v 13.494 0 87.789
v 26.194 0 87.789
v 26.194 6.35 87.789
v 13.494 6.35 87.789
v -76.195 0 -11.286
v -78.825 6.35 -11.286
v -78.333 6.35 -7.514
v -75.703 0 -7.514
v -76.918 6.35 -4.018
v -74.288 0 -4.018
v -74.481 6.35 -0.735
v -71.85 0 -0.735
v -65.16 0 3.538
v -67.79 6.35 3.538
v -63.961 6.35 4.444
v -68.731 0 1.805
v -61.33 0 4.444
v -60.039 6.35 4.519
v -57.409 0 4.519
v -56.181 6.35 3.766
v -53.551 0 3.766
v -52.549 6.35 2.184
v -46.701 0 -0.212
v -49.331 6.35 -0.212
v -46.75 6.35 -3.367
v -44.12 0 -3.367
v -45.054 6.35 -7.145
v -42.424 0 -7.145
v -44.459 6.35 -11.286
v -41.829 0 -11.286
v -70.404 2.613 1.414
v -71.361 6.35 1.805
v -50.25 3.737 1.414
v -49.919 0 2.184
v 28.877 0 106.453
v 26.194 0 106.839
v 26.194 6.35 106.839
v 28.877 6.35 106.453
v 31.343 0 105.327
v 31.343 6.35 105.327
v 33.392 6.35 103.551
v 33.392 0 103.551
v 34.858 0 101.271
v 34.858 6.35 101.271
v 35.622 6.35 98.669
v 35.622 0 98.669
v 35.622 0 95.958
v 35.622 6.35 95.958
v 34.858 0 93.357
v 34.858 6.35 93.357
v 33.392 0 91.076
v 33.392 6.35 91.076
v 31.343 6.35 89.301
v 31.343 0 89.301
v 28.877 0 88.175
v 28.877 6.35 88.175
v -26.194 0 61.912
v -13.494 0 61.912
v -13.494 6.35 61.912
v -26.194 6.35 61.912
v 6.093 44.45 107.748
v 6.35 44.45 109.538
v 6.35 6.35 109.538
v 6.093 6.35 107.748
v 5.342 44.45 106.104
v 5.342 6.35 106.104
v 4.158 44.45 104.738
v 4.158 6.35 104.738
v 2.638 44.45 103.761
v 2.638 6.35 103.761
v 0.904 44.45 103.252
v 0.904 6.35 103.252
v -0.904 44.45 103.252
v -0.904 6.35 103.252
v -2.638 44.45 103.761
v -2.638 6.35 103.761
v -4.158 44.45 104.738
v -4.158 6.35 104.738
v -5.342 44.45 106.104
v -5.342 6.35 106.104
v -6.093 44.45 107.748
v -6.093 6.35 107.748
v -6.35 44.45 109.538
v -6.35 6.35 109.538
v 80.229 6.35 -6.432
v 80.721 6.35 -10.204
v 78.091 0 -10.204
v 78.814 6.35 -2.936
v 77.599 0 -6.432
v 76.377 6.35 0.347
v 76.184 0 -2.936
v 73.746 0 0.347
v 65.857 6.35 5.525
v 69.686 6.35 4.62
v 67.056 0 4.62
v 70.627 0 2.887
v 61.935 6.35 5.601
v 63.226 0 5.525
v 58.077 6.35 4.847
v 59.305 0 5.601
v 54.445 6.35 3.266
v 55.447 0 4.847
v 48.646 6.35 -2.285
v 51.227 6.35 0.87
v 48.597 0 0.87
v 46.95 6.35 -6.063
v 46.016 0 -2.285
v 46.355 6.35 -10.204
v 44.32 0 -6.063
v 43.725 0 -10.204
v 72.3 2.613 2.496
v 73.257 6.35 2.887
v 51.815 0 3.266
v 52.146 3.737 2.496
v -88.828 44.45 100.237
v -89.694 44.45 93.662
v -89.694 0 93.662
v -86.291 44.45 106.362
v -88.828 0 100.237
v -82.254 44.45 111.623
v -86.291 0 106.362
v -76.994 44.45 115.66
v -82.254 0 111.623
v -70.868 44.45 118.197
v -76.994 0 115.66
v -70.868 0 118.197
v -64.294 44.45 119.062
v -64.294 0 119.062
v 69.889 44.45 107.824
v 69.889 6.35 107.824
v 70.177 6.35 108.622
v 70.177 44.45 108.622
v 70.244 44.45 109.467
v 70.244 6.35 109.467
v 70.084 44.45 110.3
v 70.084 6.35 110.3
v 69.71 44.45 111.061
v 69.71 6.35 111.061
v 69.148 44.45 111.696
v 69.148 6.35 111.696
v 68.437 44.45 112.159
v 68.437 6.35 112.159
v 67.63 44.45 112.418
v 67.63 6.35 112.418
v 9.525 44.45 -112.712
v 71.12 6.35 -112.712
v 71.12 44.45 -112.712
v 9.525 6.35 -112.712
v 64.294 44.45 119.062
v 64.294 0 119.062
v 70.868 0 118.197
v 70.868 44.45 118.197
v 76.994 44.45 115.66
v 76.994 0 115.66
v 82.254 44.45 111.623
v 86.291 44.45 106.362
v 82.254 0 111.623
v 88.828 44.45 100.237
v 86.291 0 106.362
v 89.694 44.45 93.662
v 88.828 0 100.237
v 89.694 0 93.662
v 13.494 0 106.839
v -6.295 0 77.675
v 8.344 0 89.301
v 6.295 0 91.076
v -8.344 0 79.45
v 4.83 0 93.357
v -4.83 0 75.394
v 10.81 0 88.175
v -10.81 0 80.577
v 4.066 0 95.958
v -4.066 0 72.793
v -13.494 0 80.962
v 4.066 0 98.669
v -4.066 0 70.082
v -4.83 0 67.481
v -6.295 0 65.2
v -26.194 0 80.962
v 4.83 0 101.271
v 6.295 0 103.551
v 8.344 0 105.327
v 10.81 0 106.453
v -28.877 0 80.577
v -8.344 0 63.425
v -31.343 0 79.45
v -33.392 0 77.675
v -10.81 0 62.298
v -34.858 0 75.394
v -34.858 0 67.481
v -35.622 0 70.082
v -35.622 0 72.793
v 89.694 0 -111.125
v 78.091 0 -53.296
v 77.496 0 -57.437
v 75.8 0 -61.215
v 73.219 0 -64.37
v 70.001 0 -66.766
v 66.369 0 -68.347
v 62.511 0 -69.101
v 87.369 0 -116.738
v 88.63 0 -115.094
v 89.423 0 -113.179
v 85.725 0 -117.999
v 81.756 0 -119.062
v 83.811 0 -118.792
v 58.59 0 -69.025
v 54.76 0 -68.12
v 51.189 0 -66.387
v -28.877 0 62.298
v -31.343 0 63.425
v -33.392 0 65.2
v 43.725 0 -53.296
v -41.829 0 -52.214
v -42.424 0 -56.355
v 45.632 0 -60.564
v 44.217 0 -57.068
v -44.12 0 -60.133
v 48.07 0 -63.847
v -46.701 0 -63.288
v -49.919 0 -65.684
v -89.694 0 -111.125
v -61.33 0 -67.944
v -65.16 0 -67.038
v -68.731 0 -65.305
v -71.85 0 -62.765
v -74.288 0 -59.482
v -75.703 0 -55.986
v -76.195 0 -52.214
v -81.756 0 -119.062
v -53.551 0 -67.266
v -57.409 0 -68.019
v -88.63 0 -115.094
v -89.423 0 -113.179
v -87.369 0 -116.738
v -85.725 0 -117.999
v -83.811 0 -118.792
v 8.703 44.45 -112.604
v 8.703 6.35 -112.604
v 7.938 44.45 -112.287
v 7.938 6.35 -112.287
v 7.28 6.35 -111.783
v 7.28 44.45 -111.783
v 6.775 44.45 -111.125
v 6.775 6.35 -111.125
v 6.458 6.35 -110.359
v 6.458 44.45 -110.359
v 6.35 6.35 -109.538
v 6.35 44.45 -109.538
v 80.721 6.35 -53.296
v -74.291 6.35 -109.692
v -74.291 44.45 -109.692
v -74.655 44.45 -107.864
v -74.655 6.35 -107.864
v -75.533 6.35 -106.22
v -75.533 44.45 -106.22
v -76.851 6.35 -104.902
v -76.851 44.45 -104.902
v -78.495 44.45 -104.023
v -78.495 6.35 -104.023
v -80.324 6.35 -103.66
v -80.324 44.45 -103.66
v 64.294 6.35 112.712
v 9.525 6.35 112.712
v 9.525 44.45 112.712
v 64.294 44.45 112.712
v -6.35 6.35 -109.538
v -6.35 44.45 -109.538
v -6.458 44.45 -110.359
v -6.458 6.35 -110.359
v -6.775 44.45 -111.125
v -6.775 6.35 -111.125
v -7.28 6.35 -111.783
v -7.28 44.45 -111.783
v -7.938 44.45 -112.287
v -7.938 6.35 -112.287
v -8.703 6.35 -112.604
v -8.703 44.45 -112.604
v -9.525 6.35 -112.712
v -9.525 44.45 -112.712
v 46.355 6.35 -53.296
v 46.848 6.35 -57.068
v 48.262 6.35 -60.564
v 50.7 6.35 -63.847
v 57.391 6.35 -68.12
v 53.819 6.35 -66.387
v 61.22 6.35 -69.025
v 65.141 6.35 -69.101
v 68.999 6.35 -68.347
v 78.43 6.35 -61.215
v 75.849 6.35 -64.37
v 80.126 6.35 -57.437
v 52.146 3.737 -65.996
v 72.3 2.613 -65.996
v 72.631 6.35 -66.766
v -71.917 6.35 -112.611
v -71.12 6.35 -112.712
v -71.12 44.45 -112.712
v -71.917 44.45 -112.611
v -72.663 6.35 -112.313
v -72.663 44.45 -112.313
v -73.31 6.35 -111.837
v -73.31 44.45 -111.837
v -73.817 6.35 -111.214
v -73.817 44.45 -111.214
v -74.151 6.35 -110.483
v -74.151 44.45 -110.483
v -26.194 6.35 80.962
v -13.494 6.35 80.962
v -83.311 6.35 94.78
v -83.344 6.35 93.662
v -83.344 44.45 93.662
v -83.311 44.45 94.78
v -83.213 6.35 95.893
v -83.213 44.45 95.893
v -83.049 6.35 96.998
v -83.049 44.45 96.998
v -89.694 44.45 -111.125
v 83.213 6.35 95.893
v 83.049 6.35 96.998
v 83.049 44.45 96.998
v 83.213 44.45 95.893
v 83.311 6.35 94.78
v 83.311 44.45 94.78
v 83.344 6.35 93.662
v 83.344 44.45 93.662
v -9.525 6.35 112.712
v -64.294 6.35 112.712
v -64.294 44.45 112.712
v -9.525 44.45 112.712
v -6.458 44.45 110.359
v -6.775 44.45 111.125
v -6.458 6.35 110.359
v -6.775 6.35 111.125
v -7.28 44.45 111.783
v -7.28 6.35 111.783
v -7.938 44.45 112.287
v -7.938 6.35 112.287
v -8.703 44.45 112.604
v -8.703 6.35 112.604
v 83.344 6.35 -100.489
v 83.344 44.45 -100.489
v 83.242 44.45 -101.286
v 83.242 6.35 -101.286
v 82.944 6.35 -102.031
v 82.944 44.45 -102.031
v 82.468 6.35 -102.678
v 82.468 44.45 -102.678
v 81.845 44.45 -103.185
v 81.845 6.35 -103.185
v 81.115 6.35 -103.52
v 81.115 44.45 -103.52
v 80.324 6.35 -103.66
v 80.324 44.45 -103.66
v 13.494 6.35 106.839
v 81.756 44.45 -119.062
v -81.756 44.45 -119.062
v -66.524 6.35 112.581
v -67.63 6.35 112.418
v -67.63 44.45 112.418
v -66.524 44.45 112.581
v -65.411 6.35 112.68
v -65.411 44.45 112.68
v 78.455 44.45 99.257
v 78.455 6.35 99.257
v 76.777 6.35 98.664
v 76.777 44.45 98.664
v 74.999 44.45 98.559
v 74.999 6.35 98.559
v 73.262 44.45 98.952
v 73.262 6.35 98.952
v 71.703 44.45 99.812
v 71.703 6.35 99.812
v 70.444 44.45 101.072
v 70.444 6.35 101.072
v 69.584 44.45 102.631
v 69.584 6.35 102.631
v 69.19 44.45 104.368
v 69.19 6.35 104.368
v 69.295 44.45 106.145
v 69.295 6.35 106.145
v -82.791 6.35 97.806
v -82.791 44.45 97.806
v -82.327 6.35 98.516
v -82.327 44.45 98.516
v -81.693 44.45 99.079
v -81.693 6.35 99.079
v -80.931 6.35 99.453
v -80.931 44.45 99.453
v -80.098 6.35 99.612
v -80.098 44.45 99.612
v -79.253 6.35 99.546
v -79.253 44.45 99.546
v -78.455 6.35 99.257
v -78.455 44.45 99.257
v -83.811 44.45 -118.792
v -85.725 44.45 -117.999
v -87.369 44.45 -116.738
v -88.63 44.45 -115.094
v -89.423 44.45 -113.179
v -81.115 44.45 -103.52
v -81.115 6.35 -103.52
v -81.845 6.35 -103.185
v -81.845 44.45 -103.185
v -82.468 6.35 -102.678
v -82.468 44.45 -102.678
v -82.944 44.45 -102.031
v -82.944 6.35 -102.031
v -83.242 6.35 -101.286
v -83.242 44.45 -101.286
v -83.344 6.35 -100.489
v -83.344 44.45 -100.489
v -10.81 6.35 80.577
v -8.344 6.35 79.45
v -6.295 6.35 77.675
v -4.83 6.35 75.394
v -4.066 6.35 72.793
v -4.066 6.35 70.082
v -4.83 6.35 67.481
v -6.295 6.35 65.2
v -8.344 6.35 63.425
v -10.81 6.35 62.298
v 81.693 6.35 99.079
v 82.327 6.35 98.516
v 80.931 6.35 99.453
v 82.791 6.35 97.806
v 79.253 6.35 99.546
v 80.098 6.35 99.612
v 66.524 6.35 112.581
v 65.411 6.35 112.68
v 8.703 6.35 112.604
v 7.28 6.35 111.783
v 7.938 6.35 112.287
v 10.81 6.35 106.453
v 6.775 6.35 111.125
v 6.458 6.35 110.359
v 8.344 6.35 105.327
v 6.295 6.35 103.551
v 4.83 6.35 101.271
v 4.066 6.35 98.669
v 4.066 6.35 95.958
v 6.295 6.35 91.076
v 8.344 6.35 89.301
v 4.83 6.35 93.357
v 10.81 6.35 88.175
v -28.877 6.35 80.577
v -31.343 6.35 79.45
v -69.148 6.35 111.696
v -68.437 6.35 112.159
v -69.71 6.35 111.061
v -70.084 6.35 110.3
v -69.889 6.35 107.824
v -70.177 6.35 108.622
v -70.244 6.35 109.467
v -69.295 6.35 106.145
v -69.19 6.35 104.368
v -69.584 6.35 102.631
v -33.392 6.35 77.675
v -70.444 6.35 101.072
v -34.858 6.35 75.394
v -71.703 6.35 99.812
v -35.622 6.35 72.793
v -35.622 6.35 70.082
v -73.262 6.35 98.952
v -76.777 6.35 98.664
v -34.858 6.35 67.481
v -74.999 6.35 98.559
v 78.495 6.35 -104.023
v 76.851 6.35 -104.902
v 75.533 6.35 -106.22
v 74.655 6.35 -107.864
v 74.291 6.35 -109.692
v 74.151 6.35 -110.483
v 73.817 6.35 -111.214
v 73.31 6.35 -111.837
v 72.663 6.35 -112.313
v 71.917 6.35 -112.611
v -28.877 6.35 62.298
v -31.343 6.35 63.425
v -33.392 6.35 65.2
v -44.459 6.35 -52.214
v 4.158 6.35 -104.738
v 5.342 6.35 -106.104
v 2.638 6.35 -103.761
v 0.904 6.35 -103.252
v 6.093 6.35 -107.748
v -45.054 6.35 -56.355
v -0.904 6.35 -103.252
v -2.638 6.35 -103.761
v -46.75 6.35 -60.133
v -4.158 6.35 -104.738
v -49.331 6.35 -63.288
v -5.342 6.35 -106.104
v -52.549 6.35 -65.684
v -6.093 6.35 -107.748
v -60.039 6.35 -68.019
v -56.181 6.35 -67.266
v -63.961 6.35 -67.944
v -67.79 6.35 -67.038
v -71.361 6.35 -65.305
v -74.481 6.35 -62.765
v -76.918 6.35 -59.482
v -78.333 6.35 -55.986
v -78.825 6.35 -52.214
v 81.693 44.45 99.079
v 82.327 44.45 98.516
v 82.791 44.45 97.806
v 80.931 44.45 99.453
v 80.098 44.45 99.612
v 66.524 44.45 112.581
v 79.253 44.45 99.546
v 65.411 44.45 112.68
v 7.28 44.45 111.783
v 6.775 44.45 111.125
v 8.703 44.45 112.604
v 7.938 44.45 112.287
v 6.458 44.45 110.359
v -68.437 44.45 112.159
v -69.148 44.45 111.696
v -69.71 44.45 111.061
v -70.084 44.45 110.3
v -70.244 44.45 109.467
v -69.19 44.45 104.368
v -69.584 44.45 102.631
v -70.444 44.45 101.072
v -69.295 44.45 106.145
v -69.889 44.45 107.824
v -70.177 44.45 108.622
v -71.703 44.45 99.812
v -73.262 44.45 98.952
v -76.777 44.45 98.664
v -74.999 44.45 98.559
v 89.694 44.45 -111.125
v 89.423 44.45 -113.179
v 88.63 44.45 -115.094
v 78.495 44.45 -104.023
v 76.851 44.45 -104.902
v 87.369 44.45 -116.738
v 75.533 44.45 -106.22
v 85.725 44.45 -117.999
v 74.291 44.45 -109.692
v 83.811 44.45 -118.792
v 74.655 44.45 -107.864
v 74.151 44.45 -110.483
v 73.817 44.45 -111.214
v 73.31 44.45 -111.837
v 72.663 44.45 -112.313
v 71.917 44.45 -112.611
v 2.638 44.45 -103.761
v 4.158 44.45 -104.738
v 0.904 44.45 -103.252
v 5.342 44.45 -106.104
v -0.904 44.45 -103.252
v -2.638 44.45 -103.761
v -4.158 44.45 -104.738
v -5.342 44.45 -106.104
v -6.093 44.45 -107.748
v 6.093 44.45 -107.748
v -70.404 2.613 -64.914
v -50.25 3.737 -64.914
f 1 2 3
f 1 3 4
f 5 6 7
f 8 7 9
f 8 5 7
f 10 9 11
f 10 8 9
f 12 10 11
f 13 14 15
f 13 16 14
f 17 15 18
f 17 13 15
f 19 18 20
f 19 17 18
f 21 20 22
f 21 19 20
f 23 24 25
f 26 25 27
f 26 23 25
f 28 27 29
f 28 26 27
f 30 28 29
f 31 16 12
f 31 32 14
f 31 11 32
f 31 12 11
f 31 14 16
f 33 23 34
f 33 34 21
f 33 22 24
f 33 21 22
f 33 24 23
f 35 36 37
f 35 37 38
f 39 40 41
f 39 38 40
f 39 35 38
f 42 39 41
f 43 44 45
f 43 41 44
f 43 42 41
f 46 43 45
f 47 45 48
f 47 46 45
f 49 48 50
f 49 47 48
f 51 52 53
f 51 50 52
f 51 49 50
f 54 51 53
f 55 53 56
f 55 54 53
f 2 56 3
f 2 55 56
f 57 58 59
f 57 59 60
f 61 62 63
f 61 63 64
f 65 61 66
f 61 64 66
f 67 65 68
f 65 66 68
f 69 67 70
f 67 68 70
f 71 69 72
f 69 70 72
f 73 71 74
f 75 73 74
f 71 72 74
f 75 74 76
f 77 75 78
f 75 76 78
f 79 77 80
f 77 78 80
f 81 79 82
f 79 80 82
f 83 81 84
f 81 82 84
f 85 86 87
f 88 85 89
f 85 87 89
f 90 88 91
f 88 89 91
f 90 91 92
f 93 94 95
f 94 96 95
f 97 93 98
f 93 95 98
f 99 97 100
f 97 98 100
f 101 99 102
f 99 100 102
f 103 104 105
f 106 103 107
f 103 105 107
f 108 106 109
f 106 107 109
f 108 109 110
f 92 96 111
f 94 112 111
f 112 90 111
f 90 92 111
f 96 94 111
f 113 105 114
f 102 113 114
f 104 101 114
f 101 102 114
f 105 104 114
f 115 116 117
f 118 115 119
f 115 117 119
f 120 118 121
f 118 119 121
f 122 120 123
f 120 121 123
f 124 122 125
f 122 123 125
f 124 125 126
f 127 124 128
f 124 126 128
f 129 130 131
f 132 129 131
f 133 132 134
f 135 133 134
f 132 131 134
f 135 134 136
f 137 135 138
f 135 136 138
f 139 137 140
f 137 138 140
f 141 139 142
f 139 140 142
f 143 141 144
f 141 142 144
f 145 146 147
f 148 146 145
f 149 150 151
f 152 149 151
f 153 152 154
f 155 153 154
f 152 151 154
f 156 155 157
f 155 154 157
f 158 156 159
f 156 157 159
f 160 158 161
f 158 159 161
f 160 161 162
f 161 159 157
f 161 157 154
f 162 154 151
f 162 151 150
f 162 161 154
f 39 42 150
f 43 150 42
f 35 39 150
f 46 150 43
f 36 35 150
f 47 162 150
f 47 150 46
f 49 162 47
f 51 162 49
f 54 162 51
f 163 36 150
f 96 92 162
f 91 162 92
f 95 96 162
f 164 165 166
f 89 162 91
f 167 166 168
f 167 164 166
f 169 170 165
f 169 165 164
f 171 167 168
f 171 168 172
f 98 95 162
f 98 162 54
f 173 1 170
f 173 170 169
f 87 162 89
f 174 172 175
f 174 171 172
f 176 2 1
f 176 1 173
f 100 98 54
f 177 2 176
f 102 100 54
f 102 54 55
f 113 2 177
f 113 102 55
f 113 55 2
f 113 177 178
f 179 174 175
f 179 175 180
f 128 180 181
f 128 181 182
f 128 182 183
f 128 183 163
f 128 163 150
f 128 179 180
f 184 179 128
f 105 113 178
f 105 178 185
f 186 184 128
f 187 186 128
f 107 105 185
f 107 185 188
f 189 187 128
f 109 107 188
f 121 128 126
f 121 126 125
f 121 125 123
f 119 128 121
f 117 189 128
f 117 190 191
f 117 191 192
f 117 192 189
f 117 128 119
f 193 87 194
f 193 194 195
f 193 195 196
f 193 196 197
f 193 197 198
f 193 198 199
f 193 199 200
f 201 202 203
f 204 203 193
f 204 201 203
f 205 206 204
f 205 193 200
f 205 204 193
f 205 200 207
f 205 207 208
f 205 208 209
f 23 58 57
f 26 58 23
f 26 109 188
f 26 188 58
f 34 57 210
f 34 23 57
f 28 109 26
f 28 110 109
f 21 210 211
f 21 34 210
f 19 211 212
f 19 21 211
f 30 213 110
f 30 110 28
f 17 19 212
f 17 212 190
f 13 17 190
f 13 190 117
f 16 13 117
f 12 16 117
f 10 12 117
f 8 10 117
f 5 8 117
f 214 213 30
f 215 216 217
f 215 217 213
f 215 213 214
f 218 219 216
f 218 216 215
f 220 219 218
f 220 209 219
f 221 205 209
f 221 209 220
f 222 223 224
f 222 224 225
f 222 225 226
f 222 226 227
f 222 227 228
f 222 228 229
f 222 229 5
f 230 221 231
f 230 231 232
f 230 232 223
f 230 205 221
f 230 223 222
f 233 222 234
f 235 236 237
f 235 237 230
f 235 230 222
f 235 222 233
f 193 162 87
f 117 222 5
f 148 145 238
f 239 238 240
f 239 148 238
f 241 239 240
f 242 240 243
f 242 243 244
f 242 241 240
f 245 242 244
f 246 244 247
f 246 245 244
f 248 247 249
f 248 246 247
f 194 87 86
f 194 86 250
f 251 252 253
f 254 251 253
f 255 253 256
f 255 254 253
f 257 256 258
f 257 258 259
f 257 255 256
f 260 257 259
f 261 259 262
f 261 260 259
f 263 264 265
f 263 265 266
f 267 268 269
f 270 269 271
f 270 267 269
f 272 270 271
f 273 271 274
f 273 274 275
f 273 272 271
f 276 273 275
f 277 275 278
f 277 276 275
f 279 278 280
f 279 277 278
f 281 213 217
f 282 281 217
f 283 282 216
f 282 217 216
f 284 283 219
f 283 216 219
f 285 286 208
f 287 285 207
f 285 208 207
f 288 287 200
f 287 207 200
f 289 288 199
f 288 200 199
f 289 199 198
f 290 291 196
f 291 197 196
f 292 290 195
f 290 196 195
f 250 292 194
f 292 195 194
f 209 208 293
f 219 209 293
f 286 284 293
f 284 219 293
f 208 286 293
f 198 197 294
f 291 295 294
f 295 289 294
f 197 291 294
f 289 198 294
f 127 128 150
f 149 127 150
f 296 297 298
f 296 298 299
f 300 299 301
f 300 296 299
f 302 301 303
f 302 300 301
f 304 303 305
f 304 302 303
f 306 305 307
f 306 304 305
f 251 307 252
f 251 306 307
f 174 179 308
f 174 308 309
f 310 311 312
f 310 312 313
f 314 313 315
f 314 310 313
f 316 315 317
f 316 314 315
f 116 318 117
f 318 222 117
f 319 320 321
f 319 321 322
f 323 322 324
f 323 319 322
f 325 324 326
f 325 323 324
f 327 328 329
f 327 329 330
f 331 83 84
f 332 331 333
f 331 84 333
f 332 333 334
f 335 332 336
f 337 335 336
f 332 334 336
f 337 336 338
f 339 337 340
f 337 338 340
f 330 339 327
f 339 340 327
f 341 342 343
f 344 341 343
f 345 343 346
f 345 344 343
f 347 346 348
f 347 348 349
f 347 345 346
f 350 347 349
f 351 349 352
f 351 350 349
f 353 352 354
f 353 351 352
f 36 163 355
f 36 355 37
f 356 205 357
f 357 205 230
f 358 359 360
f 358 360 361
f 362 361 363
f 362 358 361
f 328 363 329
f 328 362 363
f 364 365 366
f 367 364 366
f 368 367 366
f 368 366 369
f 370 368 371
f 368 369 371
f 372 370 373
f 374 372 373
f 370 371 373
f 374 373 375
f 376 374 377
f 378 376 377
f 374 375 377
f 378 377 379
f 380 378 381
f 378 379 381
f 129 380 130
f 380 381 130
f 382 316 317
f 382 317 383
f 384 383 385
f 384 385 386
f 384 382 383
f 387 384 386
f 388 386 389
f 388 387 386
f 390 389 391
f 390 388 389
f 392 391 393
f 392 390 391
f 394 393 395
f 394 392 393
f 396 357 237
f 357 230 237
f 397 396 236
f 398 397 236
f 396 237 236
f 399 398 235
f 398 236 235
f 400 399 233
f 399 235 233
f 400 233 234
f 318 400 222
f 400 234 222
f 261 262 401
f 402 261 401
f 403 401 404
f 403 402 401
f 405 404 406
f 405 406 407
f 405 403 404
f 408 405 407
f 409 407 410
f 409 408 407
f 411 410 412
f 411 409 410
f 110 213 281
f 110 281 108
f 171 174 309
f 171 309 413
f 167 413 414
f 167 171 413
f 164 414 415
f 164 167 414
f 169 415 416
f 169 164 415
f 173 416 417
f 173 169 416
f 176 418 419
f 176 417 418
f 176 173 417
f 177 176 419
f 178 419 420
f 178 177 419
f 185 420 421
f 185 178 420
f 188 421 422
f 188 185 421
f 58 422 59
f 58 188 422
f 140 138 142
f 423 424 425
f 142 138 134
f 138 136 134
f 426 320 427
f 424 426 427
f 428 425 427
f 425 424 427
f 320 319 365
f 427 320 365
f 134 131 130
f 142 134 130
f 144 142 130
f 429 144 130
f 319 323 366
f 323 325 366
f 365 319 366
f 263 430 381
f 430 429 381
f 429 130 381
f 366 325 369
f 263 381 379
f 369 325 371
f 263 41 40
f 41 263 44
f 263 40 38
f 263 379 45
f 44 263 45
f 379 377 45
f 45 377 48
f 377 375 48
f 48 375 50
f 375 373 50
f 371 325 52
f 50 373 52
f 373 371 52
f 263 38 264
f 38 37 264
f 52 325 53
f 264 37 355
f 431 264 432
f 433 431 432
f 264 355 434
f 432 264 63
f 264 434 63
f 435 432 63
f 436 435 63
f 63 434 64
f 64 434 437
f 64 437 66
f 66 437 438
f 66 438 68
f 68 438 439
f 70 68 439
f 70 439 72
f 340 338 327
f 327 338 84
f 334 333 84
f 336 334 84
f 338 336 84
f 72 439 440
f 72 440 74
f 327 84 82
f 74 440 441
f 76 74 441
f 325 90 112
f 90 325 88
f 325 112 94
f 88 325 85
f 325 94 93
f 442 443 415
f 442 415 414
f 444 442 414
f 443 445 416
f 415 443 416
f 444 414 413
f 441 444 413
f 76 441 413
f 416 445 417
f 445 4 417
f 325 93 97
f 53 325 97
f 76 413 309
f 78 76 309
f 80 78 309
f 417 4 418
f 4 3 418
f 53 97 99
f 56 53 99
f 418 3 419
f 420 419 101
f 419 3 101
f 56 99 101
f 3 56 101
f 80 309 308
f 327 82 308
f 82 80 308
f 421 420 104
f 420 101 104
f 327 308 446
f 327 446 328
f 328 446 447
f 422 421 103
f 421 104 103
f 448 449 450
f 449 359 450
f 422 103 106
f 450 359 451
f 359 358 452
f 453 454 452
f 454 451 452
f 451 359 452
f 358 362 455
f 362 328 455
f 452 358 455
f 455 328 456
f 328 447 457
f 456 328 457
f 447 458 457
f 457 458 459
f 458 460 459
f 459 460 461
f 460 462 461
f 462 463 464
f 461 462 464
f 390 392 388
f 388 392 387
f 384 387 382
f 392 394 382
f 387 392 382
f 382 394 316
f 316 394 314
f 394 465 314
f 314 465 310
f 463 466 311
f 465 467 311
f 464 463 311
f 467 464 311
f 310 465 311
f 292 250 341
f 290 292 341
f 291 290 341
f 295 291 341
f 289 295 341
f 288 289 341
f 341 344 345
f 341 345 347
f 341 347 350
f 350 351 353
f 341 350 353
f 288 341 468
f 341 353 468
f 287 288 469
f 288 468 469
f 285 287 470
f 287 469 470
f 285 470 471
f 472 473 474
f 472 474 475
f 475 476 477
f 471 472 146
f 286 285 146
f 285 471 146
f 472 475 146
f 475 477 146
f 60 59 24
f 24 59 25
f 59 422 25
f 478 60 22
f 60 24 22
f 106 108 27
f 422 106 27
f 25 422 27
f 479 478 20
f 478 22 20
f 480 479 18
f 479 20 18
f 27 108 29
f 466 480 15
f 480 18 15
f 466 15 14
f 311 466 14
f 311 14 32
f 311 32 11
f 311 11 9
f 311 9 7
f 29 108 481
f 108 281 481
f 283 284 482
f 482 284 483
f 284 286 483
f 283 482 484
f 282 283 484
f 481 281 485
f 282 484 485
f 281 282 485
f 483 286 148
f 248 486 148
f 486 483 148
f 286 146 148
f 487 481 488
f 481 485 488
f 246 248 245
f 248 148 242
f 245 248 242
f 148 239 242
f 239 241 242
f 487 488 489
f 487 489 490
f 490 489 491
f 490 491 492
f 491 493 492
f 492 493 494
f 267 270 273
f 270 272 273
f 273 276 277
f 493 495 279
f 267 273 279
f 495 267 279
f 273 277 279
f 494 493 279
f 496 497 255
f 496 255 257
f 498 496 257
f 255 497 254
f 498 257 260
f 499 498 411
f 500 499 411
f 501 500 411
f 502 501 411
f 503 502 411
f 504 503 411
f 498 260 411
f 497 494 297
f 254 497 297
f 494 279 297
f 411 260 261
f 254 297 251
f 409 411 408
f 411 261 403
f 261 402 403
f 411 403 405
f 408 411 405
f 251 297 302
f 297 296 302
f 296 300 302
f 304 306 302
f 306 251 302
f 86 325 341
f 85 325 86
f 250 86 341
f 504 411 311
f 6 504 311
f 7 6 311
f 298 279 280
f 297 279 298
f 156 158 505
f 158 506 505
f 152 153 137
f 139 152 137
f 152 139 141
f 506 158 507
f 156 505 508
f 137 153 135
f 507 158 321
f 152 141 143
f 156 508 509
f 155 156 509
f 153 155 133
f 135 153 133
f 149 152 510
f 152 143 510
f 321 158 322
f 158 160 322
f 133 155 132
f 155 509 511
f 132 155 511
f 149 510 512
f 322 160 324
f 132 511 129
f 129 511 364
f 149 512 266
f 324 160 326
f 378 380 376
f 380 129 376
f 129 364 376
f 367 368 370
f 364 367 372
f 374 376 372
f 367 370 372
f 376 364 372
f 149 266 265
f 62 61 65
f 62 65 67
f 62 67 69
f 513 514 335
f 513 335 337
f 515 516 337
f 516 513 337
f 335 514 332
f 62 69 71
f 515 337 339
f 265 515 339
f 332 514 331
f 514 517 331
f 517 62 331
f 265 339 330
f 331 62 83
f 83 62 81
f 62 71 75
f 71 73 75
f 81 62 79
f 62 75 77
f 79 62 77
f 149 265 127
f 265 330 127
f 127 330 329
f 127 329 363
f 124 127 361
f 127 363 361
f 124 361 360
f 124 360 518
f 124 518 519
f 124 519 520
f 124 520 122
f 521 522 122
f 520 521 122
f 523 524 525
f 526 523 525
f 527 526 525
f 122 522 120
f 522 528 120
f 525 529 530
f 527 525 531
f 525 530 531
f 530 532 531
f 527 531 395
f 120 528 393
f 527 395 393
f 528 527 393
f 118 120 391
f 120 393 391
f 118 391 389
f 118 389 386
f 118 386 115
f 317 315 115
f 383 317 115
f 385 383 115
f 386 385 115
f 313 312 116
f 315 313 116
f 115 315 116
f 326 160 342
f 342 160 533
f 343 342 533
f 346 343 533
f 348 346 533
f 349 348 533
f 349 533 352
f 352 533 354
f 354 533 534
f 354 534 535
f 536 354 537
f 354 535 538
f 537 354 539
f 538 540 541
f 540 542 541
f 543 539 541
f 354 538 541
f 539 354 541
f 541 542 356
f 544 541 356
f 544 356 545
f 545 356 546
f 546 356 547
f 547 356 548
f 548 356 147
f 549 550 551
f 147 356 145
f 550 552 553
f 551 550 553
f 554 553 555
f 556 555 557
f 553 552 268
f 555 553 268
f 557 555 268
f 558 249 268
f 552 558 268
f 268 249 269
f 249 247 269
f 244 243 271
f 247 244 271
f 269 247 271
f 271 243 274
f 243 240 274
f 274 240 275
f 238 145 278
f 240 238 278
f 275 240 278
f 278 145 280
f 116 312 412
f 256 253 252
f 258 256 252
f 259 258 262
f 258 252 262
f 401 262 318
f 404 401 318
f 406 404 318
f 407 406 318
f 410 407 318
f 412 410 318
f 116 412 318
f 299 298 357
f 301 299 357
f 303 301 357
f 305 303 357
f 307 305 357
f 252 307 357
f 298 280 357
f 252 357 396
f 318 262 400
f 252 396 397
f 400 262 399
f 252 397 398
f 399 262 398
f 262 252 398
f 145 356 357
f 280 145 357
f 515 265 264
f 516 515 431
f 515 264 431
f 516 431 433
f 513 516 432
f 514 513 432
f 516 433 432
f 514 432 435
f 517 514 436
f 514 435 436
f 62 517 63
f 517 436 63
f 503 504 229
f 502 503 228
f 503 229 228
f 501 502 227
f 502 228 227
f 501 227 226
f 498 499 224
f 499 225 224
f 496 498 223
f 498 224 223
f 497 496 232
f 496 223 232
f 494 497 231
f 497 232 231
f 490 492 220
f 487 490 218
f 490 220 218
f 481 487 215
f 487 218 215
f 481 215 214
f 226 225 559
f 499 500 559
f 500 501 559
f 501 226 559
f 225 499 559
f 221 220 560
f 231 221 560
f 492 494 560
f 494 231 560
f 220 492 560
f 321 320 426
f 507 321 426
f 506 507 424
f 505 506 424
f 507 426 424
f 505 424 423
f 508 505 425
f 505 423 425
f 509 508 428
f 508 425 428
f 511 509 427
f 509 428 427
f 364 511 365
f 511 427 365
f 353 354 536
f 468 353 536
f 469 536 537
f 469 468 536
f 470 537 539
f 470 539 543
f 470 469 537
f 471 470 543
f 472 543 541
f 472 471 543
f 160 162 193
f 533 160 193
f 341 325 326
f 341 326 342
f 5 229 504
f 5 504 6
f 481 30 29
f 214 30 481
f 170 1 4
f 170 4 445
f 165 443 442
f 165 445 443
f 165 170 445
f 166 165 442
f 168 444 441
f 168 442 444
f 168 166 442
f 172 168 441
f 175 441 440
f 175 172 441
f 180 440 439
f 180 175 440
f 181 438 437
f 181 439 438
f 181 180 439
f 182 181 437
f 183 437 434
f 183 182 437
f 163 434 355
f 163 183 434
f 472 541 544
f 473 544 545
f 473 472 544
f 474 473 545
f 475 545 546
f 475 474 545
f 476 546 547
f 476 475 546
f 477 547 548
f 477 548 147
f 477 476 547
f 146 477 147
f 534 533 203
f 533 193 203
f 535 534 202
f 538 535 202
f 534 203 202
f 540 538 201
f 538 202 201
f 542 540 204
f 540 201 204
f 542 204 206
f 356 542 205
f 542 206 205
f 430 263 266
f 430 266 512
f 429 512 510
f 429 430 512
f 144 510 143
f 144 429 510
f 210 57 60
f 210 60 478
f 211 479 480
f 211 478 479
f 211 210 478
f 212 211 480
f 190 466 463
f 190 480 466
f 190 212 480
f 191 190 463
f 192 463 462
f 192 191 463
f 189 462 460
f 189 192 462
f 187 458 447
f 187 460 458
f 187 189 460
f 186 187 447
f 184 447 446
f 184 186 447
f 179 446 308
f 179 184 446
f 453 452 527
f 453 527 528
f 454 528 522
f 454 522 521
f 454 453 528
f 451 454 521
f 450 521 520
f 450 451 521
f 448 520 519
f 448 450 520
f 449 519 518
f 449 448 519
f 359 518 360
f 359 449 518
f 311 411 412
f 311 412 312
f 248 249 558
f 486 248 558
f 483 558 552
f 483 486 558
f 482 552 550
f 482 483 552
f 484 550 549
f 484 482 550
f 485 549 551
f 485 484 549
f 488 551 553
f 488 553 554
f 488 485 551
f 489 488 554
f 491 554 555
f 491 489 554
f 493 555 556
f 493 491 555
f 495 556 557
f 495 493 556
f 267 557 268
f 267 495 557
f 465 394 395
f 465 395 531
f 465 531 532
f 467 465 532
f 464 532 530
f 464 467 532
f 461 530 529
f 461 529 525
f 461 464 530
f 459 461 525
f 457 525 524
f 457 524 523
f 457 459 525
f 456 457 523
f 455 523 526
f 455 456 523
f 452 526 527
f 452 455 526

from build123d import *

# Parameters (mm, degrees)
BOSS_EXTRUDE1_DEPTH     = 6.35
BOSS_EXTRUDE2_DEPTH     = 38.1
CUT_EXTRUDE1_DEPTH      = 12.7
CUT_EXTRUDE1_DEPTH_BACK = 25.4
CUT_EXTRUDE2_DEPTH      = 6.35
CUT_EXTRUDE2_DEPTH_BACK = 25.4
CUT_EXTRUDE3_DEPTH      = 156.552724943
BOSS_EXTRUDE3_DEPTH     = 38.1


with BuildPart() as part:
    # Sketch1 → Boss-Extrude1 (new body)
    with BuildSketch(Plane(origin=(0, 0, 0), x_dir=(1, 0, 0), z_dir=(0, 1, 0))):
        with BuildLine():
            Line((-81.75625, 119.0625), (81.75625, 119.0625))
            ThreePointArc((81.75625, 119.0625), (87.368910076, 116.737660076), (89.69375, 111.125))
            Line((89.69375, 111.125), (89.69375, -93.6625))
            ThreePointArc((89.69375, -93.6625), (82.254262242, -111.623012242), (64.29375, -119.0625))
            Line((64.29375, -119.0625), (-64.29375, -119.0625))
            ThreePointArc((-64.29375, -119.0625), (-82.254262242, -111.623012242), (-89.69375, -93.6625))
            Line((-89.69375, -93.6625), (-89.69375, 111.125))
            ThreePointArc((-89.69375, 111.125), (-87.368910076, 116.737660076), (-81.75625, 119.0625))
        make_face()
    extrude(amount=BOSS_EXTRUDE1_DEPTH)

    # Sketch2 → Boss-Extrude2 (add)
    with BuildSketch(Plane(origin=(0, 6.35, 0), x_dir=(1, 0, 0), z_dir=(0, 1, 0))):
        with BuildLine():
            Line((89.69375, -93.6625), (89.69375, 111.125))
            ThreePointArc((89.69375, 111.125), (87.368910076, 116.737660076), (81.75625, 119.0625))
            Line((81.75625, 119.0625), (-81.75625, 119.0625))
            ThreePointArc((-81.75625, 119.0625), (-87.368910076, 116.737660076), (-89.69375, 111.125))
            Line((-89.69375, 111.125), (-89.69375, -93.6625))
            ThreePointArc((-89.69375, -93.6625), (-82.254262242, -111.623012242), (-64.29375, -119.0625))
            Line((-64.29375, -119.0625), (64.29375, -119.0625))
            ThreePointArc((64.29375, -119.0625), (82.254262242, -111.623012242), (89.69375, -93.6625))
        make_face()
        with BuildLine():
            Line((81.75625, 112.7125), (-81.75625, 112.7125))
            ThreePointArc((-81.75625, 112.7125), (-82.878782015, 112.247532015), (-83.34375, 111.125))
            Line((-83.34375, 111.125), (-83.34375, -93.6625))
            ThreePointArc((-83.34375, -93.6625), (-77.764134182, -107.132884182), (-64.29375, -112.7125))
            Line((-64.29375, -112.7125), (64.29375, -112.7125))
            ThreePointArc((64.29375, -112.7125), (77.764134182, -107.132884182), (83.34375, -93.6625))
            Line((83.34375, -93.6625), (83.34375, 111.125))
            ThreePointArc((83.34375, 111.125), (82.878782015, 112.247532015), (81.75625, 112.7125))
        make_face(mode=Mode.SUBTRACT)
    extrude(amount=BOSS_EXTRUDE2_DEPTH)

    # Sketch5 → Cut-Extrude1 (cut, two sides: drawn at the far end of the back side and taken through both)
    with BuildSketch(Plane(origin=(-13.135345572, 31.711529428, 0), x_dir=(0, 0, 1), z_dir=(-0.38268343236509383, 0.9238795325112852, 0)).offset(-CUT_EXTRUDE1_DEPTH_BACK)):
        with BuildLine():
            Line((-52.21366875, -70.394979916), (-11.28633125, -70.394979916))
            add(Edge.make_bspline(
                [(-11.28633125, -70.394979916), (20.46366875, -70.394979916), (20.46366875, -38.644979916), (-11.28633125, -38.644979916)],
                knots=[0, 0, 0, 0, 1, 1, 1, 1], degree=3, weights=[1, 0.333333333, 0.333333333, 1]))
            Line((-11.28633125, -38.644979916), (-52.21366875, -38.644979916))
            add(Edge.make_bspline(
                [(-52.21366875, -70.394979916), (-83.96366875, -70.394979916), (-83.96366875, -38.644979916), (-52.21366875, -38.644979916)],
                knots=[0, 0, 0, 0, 1, 1, 1, 1], degree=3, weights=[1, 0.333333333, 0.333333333, 1]))
        make_face()
    extrude(amount=CUT_EXTRUDE1_DEPTH + CUT_EXTRUDE1_DEPTH_BACK, mode=Mode.SUBTRACT)

    # Sketch7 → Cut-Extrude2 (cut, two sides: drawn at the far end of the back side and taken through both)
    with BuildSketch(Plane(origin=(13.135345572, 31.711529428, 0), x_dir=(0, 0, -1), z_dir=(0.3826834323650874, 0.9238795325112878, 0)).offset(-CUT_EXTRUDE2_DEPTH_BACK)):
        with BuildLine():
            Line((10.20445, -72.146741698), (53.29555, -72.146741698))
            add(Edge.make_bspline(
                [(53.29555, -40.396741698), (85.04555, -40.396741698), (85.04555, -72.146741698), (53.29555, -72.146741698)],
                knots=[0, 0, 0, 0, 1, 1, 1, 1], degree=3, weights=[1, 0.333333333, 0.333333333, 1]))
            Line((53.29555, -40.396741698), (10.20445, -40.396741698))
            add(Edge.make_bspline(
                [(10.20445, -72.146741698), (-21.54555, -72.146741698), (-21.54555, -40.396741698), (10.20445, -40.396741698)],
                knots=[0, 0, 0, 0, 1, 1, 1, 1], degree=3, weights=[1, 0.333333333, 0.333333333, 1]))
        make_face()
    extrude(amount=CUT_EXTRUDE2_DEPTH + CUT_EXTRUDE2_DEPTH_BACK, mode=Mode.SUBTRACT)

    # Sketch8 → Cut-Extrude3 (cut, through all)
    with BuildSketch(Plane.XZ):
        with BuildLine():
            Line((13.49375, 106.83875), (26.19375, 106.83875))
            ThreePointArc((26.19375, 106.83875), (35.71875, 97.31375), (26.19375, 87.78875))
            Line((26.19375, 87.78875), (13.49375, 87.78875))
            ThreePointArc((13.49375, 87.78875), (3.96875, 97.31375), (13.49375, 106.83875))
        make_face()
        with BuildLine():
            Line((-26.19375, 80.9625), (-13.49375, 80.9625))
            ThreePointArc((-13.49375, 80.9625), (-3.96875, 71.4375), (-13.49375, 61.9125))
            Line((-13.49375, 61.9125), (-26.19375, 61.9125))
            ThreePointArc((-26.19375, 61.9125), (-35.71875, 71.4375), (-26.19375, 80.9625))
        make_face()
    extrude(amount=-CUT_EXTRUDE3_DEPTH, mode=Mode.SUBTRACT)

    # Sketch9 → Boss-Extrude3 (add)
    with BuildSketch(Plane(origin=(0, 6.35, 0), x_dir=(1, 0, 0), z_dir=(0, 1, 0))):
        with BuildLine():
            Line((-81.75625, 112.7125), (-71.120073585, 112.7125))
            ThreePointArc((-71.120073585, 112.7125), (-73.309655038, 111.836708137), (-74.291288385, 109.692489328))
            ThreePointArc((-74.291288385, 109.692489328), (-76.143589924, 105.512339924), (-80.323739328, 103.660038385))
            ThreePointArc((-80.323739328, 103.660038385), (-82.467958137, 102.678405038), (-83.34375, 100.488823585))
            Line((-83.34375, 100.488823585), (-83.34375, 111.125))
            ThreePointArc((-83.34375, 111.125), (-82.878782015, 112.247532015), (-81.75625, 112.7125))
        make_face()
        with BuildLine():
            Line((-9.525, -112.7125), (9.525, -112.7125))
            ThreePointArc((9.525, -112.7125), (7.27993597, -111.78256403), (6.35, -109.5375))
            ThreePointArc((6.35, -109.5375), (0, -103.1875), (-6.35, -109.5375))
            ThreePointArc((-6.35, -109.5375), (-7.27993597, -111.78256403), (-9.525, -112.7125))
        make_face()
        with BuildLine():
            Line((-9.525, 112.7125), (9.525, 112.7125))
            ThreePointArc((9.525, 112.7125), (7.27993597, 111.78256403), (6.35, 109.5375))
            ThreePointArc((6.35, 109.5375), (0, 103.1875), (-6.35, 109.5375))
            ThreePointArc((-6.35, 109.5375), (-7.27993597, 111.78256403), (-9.525, 112.7125))
        make_face()
        with BuildLine():
            Line((83.34375, 111.125), (83.34375, 100.488823585))
            ThreePointArc((83.34375, 100.488823585), (82.467958137, 102.678405038), (80.323739328, 103.660038385))
            ThreePointArc((80.323739328, 103.660038385), (76.143589924, 105.512339924), (74.291288385, 109.692489328))
            ThreePointArc((74.291288385, 109.692489328), (73.309655038, 111.836708137), (71.120073585, 112.7125))
            Line((71.120073585, 112.7125), (81.75625, 112.7125))
            ThreePointArc((81.75625, 112.7125), (82.878782015, 112.247532015), (83.34375, 111.125))
        make_face()
        with BuildLine():
            ThreePointArc((-83.049421546, -96.998258512), (-81.324581361, -99.291426622), (-78.45534091, -99.257472557))
            ThreePointArc((-78.45534091, -99.257472557), (-71.028942091, -100.397692091), (-69.888722557, -107.82409091))
            ThreePointArc((-69.888722557, -107.82409091), (-69.922676622, -110.693331361), (-67.629508512, -112.418171546))
            ThreePointArc((-67.629508512, -112.418171546), (-77.764134182, -107.132884182), (-83.049421546, -96.998258512))
        make_face()
        with BuildLine():
            ThreePointArc((69.888722557, -107.82409091), (69.922676622, -110.693331361), (67.629508512, -112.418171546))
            ThreePointArc((67.629508512, -112.418171546), (77.764134182, -107.132884182), (83.049421546, -96.998258512))
            ThreePointArc((83.049421546, -96.998258512), (81.324581361, -99.291426622), (78.45534091, -99.257472557))
            ThreePointArc((78.45534091, -99.257472557), (71.028942091, -100.397692091), (69.888722557, -107.82409091))
        make_face()
    extrude(amount=BOSS_EXTRUDE3_DEPTH)


solid = part.part
